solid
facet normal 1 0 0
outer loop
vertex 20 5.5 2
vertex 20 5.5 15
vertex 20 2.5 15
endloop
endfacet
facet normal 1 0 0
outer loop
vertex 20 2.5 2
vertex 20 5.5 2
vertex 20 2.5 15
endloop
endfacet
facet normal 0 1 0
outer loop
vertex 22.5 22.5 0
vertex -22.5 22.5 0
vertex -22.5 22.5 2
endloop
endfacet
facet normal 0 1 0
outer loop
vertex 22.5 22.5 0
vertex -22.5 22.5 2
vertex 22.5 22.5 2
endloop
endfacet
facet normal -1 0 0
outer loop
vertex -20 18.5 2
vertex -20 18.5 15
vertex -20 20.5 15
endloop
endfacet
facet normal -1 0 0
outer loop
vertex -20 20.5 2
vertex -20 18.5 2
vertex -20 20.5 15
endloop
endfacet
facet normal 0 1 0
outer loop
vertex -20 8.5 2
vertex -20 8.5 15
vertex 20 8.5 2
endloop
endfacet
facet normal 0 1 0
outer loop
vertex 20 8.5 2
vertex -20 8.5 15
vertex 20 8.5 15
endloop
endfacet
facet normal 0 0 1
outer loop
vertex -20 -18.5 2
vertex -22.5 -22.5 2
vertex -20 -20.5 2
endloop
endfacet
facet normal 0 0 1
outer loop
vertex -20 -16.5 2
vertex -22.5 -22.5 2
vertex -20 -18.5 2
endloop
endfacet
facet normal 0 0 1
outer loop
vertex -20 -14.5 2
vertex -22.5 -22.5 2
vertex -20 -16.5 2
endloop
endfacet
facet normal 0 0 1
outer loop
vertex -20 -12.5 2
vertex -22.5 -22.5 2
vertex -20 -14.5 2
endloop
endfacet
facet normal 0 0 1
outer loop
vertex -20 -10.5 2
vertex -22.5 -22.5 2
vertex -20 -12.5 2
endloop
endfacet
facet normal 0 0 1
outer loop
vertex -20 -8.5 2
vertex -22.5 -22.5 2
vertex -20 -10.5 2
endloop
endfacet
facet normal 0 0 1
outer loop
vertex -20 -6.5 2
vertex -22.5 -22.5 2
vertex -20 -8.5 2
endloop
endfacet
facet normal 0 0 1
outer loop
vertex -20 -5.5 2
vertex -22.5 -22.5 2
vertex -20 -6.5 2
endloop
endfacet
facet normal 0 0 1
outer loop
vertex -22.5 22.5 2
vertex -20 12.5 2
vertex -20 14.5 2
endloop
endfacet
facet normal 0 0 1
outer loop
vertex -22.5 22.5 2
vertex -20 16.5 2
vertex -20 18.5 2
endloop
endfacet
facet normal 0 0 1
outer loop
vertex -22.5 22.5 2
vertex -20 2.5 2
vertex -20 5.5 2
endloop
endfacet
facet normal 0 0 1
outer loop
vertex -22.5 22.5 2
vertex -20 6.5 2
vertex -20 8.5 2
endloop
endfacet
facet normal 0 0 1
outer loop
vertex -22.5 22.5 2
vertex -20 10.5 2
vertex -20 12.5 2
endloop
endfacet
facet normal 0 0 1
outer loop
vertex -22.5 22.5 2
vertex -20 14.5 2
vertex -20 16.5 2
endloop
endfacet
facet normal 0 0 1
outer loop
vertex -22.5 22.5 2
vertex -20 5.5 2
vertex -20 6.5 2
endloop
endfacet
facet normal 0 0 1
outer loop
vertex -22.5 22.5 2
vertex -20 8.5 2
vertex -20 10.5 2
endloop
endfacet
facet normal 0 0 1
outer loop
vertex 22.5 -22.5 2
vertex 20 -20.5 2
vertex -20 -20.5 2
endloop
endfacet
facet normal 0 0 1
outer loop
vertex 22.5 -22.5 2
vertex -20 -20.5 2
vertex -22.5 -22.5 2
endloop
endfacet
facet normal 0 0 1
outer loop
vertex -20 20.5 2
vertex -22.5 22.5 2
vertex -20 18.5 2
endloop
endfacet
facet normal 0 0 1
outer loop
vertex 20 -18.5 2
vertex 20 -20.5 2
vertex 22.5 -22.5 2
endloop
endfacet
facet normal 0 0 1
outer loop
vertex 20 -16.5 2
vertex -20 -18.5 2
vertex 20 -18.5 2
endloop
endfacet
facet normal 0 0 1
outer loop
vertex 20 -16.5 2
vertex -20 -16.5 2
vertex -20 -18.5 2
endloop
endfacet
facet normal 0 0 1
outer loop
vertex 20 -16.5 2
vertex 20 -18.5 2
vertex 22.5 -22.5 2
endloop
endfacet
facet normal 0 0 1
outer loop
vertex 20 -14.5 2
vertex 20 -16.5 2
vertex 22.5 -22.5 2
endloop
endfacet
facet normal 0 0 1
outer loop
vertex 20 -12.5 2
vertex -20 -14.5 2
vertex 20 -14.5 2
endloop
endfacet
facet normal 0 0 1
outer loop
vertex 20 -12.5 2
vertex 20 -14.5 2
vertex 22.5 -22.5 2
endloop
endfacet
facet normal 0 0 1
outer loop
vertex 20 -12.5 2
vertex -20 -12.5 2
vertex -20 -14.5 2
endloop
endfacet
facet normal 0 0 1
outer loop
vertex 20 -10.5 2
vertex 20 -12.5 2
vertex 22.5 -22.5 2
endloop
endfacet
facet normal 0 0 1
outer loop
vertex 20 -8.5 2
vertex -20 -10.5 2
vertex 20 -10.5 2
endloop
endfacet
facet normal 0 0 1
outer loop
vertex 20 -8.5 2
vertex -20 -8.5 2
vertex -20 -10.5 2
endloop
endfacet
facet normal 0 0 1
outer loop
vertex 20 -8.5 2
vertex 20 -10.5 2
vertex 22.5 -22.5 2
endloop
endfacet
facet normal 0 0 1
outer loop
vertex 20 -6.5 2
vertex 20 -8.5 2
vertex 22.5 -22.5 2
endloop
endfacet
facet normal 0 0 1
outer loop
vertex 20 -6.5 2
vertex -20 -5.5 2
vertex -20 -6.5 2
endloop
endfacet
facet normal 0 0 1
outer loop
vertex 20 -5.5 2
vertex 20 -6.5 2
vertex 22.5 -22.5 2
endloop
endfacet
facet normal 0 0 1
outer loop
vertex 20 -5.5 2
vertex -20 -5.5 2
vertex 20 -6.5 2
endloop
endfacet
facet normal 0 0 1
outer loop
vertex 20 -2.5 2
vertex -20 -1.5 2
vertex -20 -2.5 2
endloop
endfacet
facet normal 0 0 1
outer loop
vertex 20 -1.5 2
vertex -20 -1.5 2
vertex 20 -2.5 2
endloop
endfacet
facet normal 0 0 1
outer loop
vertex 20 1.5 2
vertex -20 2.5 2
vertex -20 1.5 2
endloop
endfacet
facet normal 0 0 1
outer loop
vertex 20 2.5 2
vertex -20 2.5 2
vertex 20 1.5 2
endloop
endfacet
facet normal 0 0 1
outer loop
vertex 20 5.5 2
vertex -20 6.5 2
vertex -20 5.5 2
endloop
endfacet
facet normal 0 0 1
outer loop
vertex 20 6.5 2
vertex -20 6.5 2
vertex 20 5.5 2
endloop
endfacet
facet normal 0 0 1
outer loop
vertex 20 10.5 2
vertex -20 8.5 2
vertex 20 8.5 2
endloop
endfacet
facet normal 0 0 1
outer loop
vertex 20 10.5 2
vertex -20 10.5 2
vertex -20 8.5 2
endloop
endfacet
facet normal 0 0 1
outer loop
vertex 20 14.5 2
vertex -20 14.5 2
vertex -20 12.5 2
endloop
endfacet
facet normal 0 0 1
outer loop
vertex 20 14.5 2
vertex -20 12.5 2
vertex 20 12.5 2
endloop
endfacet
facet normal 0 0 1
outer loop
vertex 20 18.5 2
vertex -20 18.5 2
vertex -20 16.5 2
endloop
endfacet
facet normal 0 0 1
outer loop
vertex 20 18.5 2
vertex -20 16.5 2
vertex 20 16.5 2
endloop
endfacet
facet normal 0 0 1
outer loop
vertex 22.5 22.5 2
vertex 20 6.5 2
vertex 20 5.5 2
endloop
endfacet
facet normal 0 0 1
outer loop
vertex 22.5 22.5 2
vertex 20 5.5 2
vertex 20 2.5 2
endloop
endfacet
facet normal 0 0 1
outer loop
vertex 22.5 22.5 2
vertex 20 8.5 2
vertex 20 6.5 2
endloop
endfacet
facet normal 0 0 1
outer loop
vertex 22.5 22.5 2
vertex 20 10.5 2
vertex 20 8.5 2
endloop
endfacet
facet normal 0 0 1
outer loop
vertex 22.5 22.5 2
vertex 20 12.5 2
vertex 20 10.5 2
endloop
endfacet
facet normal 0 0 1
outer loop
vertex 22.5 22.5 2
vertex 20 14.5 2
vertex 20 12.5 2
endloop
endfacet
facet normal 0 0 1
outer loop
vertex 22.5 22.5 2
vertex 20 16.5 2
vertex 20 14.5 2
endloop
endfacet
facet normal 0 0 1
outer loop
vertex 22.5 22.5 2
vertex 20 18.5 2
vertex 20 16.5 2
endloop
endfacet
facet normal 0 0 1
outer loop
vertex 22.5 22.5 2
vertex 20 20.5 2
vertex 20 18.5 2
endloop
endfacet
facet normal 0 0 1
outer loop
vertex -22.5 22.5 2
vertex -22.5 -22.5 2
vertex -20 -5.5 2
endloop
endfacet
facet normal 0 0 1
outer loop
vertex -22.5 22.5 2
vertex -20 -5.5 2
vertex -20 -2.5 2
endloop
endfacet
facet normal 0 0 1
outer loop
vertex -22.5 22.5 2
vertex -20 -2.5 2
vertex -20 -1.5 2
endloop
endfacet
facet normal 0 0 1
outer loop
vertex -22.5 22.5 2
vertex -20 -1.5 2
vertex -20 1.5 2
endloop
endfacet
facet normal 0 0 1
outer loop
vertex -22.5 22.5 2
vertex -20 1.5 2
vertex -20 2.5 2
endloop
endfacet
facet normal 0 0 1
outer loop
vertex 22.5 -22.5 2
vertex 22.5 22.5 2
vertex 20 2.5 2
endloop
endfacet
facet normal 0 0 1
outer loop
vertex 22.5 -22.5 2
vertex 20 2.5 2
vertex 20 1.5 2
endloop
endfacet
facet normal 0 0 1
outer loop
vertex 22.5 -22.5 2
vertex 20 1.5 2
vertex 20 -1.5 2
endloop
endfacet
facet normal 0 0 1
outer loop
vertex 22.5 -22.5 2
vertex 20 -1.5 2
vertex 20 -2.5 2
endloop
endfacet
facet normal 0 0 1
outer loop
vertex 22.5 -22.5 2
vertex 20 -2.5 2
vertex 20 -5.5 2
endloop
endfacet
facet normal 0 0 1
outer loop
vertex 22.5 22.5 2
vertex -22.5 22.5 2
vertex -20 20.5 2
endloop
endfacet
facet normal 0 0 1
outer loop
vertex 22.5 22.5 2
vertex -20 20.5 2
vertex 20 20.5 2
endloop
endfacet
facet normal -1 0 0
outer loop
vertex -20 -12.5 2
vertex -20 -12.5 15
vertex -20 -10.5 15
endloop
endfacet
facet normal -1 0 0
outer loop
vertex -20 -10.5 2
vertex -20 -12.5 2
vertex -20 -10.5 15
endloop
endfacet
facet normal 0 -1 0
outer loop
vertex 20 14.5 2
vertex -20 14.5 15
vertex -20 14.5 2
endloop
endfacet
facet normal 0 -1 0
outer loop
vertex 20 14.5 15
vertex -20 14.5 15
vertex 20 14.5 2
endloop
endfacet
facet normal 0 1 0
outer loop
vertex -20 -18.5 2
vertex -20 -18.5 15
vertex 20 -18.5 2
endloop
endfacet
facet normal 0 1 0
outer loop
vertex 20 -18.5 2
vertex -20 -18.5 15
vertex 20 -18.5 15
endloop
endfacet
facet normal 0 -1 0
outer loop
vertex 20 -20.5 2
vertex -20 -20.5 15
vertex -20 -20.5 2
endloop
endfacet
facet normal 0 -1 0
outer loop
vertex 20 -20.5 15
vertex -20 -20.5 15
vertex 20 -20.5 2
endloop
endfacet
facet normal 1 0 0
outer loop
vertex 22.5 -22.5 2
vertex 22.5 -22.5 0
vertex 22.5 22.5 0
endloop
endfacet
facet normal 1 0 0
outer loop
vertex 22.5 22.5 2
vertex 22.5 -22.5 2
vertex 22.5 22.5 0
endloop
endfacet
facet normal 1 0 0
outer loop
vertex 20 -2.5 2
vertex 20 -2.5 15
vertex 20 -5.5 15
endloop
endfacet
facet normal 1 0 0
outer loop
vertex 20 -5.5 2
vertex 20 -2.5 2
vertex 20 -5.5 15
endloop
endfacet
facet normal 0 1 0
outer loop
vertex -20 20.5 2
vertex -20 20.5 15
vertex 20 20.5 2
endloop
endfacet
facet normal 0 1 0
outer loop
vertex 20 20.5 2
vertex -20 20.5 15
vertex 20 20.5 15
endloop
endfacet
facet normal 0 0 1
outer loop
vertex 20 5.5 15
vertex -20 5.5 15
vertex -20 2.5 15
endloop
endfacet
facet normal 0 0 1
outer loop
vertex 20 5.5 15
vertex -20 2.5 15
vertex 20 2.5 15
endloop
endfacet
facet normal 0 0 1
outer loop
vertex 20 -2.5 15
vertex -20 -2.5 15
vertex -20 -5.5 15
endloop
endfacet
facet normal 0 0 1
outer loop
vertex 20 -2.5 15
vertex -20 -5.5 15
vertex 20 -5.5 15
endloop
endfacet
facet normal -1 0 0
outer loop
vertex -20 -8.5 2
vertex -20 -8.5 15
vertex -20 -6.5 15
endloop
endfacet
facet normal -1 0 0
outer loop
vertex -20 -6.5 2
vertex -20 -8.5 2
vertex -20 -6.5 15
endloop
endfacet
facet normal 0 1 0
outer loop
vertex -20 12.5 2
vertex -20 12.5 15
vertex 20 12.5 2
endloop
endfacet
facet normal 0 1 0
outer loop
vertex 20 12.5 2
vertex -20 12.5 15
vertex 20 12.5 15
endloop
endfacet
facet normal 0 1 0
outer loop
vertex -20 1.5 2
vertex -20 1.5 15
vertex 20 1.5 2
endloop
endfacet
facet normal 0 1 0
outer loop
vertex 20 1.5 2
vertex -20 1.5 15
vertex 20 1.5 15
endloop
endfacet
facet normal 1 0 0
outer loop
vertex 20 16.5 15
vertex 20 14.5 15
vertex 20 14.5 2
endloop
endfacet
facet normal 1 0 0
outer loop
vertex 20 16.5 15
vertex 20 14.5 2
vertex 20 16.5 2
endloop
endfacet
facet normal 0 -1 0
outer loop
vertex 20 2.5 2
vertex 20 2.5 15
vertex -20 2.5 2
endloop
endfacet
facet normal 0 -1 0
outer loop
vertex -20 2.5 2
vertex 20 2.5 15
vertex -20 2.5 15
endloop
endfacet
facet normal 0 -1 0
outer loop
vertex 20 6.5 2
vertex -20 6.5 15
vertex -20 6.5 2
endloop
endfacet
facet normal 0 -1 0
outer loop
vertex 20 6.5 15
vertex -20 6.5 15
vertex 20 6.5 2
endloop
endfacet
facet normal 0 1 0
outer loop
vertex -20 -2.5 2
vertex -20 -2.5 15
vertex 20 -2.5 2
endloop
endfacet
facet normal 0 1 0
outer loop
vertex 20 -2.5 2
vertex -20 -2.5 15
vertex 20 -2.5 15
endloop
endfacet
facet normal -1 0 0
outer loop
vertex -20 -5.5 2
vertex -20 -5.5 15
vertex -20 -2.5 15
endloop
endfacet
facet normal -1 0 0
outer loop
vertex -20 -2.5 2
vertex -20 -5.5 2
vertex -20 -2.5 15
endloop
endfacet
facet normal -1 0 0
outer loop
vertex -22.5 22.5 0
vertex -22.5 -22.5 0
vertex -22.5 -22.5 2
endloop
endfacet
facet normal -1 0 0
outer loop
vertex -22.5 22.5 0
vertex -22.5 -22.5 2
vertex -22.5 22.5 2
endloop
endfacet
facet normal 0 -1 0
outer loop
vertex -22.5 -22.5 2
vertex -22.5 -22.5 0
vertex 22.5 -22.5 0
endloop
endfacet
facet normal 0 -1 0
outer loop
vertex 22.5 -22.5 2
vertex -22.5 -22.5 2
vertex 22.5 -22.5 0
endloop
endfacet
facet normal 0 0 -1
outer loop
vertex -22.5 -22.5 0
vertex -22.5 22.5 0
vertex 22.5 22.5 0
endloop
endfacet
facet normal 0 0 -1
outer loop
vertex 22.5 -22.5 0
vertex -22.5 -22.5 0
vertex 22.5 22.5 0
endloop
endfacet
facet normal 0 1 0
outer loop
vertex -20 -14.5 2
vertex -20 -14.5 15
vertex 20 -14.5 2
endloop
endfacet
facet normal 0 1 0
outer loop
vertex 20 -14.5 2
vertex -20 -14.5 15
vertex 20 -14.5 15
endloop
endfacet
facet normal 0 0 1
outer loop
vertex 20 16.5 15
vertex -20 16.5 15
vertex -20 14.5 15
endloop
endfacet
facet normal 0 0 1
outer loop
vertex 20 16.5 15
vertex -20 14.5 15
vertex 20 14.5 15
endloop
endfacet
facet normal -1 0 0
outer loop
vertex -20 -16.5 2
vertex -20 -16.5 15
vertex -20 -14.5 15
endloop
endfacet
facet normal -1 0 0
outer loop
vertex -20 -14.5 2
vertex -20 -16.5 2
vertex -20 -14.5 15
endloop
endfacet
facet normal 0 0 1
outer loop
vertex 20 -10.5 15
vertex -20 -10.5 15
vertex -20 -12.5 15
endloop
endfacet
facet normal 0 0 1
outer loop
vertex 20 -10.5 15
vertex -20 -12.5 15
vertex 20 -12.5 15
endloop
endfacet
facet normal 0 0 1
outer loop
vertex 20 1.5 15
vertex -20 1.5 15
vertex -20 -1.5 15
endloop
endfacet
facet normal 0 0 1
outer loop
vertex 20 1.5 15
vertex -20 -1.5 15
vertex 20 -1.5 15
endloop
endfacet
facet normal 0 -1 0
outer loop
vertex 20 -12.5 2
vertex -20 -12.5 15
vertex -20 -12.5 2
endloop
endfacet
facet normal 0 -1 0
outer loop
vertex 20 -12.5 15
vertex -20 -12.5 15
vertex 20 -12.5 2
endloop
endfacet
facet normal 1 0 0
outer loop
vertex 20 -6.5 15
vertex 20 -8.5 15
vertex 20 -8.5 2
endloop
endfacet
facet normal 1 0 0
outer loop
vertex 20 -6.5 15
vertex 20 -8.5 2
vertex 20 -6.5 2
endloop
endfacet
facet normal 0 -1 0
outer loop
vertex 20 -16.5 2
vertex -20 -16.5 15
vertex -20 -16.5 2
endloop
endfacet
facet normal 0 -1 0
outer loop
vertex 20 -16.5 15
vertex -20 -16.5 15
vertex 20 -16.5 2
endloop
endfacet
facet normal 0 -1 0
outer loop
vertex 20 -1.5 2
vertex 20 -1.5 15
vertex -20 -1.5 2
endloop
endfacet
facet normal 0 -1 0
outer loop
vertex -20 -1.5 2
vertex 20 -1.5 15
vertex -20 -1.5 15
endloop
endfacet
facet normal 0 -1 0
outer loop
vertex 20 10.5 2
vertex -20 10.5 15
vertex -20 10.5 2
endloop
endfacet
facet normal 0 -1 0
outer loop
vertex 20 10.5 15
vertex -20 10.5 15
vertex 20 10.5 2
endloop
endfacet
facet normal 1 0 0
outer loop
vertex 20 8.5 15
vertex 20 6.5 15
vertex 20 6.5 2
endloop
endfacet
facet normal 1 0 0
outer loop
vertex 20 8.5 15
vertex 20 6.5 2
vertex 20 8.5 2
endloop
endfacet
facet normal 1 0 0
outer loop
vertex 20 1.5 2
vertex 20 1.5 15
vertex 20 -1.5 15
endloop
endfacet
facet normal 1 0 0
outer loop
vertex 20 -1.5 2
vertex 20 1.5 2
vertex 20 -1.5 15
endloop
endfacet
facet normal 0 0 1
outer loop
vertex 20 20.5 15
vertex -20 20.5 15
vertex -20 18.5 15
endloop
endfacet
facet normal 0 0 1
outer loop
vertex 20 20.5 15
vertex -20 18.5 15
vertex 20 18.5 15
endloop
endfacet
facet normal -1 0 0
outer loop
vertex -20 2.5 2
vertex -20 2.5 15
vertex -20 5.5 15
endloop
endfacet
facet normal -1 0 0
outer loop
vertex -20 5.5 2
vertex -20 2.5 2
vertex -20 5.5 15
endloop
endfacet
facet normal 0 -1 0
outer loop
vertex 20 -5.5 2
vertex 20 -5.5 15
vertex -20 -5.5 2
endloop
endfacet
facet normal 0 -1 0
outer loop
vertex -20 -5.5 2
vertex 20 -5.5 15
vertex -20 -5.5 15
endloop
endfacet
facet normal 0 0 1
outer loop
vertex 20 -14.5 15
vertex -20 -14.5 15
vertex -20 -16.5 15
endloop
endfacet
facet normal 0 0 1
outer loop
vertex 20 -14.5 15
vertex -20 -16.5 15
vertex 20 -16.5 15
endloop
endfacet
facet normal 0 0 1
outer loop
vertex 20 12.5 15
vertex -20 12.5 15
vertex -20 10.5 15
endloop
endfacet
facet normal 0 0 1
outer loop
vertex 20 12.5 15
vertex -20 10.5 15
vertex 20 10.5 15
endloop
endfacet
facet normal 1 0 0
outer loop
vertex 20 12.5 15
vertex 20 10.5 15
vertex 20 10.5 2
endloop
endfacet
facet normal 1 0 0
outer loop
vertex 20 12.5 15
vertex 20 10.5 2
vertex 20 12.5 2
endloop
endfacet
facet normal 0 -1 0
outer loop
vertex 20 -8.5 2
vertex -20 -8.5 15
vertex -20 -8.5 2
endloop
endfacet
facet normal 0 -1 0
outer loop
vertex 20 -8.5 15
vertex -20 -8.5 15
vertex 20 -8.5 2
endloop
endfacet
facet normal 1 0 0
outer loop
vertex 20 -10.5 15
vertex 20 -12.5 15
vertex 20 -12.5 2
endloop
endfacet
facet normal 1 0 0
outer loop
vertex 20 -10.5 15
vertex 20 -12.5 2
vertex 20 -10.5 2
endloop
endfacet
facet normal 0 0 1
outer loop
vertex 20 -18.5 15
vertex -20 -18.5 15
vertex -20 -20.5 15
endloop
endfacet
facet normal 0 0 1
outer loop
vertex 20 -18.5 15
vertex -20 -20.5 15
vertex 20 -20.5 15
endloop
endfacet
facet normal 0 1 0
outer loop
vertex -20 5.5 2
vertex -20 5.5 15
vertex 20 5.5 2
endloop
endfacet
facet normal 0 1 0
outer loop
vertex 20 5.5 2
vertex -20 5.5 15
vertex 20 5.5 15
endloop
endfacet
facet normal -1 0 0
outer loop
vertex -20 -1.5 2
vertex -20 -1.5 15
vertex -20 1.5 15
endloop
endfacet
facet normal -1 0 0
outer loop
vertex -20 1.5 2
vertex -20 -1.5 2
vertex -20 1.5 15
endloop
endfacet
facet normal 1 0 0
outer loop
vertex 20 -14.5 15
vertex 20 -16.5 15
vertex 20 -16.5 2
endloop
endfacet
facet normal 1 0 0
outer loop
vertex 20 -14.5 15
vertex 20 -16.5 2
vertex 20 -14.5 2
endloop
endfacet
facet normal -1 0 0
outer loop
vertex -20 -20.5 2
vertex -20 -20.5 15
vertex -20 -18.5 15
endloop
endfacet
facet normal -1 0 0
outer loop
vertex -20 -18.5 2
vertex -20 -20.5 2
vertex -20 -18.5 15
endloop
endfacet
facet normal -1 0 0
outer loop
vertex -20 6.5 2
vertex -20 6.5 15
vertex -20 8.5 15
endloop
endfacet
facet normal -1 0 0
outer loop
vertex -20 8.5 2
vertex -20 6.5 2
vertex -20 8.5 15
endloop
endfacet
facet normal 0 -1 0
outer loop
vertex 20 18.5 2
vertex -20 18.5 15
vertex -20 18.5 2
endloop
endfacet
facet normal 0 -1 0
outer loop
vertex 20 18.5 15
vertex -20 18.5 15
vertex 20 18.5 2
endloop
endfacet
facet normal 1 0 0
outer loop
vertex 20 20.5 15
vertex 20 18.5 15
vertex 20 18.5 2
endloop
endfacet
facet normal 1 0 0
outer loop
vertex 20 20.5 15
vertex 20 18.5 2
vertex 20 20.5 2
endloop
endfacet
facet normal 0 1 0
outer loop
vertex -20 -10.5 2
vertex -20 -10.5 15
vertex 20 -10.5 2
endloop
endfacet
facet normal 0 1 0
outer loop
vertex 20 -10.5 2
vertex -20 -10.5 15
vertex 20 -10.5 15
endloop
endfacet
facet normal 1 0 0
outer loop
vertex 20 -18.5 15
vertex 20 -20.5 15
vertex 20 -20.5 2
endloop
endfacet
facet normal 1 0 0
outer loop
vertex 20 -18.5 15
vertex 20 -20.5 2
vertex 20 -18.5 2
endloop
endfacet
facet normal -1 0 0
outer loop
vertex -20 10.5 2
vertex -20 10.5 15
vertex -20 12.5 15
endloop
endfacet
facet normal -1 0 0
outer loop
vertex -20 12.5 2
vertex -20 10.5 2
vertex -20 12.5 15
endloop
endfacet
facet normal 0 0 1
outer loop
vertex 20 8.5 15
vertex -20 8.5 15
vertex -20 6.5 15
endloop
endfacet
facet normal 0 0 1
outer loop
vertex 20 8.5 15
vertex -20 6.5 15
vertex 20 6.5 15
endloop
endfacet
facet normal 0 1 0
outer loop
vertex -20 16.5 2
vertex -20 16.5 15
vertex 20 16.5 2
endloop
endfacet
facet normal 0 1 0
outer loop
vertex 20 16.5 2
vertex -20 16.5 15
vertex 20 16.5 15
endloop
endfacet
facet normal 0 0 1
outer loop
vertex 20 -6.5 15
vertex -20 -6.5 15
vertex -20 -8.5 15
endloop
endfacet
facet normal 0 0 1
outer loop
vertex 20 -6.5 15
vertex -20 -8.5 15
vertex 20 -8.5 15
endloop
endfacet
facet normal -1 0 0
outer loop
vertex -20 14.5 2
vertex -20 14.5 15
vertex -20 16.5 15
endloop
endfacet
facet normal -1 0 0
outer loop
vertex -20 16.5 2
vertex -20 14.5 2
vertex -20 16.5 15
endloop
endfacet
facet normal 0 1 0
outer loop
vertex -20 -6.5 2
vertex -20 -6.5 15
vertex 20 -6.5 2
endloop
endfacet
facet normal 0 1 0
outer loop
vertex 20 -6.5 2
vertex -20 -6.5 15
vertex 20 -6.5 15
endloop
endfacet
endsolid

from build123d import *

# Parameters (mm, degrees)
F0_W     = 45
F0_H     = 45
F1_DEPTH = 15
F2_W     = 45
F2_H     = 45
F2_W_2   = 40
F2_H_2   = 2
F3_DEPTH = 13


with BuildPart() as f1:
    # F0 (on Top) → F1 (new body)
    with BuildSketch(Plane.XY):
        Rectangle(F0_W, F0_H)
    extrude(amount=F1_DEPTH)

    # F2 (on face) → F3 (cut)
    with BuildSketch(Plane.XY.offset(15)):
        Rectangle(F2_W, F2_H)
        with Locations((0, -19.5)):
            Rectangle(F2_W_2, F2_H_2, mode=Mode.SUBTRACT)
        with Locations((0, -15.5)):
            Rectangle(F2_W_2, F2_H_2, mode=Mode.SUBTRACT)
        with Locations((0, -11.5)):
            Rectangle(F2_W_2, F2_H_2, mode=Mode.SUBTRACT)
        with Locations((0, -7.5)):
            Rectangle(F2_W_2, F2_H_2, mode=Mode.SUBTRACT)
        Polygon((-20, -4.5), (-20, -3.5), (-20, -2.5), (20, -2.5), (20, -3.5), (20, -4.5), (20, -5.5), (-20, -5.5), align=None, mode=Mode.SUBTRACT)
        Polygon((-20, -0.5), (-20, 0.5), (-20, 1.5), (20, 1.5), (20, 0.5), (20, -0.5), (20, -1.5), (-20, -1.5), align=None, mode=Mode.SUBTRACT)
        Polygon((-20, 3.5), (-20, 4.5), (-20, 5.5), (20, 5.5), (20, 4.5), (20, 3.5), (20, 2.5), (-20, 2.5), align=None, mode=Mode.SUBTRACT)
        with Locations((0, 7.5)):
            Rectangle(F2_W_2, F2_H_2, mode=Mode.SUBTRACT)
        with Locations((0, 11.5)):
            Rectangle(F2_W_2, F2_H_2, mode=Mode.SUBTRACT)
        with Locations((0, 15.5)):
            Rectangle(F2_W_2, F2_H_2, mode=Mode.SUBTRACT)
        with Locations((0, 19.5)):
            Rectangle(F2_W_2, F2_H_2, mode=Mode.SUBTRACT)
    extrude(amount=-F3_DEPTH, mode=Mode.SUBTRACT)


solid = f1.part
